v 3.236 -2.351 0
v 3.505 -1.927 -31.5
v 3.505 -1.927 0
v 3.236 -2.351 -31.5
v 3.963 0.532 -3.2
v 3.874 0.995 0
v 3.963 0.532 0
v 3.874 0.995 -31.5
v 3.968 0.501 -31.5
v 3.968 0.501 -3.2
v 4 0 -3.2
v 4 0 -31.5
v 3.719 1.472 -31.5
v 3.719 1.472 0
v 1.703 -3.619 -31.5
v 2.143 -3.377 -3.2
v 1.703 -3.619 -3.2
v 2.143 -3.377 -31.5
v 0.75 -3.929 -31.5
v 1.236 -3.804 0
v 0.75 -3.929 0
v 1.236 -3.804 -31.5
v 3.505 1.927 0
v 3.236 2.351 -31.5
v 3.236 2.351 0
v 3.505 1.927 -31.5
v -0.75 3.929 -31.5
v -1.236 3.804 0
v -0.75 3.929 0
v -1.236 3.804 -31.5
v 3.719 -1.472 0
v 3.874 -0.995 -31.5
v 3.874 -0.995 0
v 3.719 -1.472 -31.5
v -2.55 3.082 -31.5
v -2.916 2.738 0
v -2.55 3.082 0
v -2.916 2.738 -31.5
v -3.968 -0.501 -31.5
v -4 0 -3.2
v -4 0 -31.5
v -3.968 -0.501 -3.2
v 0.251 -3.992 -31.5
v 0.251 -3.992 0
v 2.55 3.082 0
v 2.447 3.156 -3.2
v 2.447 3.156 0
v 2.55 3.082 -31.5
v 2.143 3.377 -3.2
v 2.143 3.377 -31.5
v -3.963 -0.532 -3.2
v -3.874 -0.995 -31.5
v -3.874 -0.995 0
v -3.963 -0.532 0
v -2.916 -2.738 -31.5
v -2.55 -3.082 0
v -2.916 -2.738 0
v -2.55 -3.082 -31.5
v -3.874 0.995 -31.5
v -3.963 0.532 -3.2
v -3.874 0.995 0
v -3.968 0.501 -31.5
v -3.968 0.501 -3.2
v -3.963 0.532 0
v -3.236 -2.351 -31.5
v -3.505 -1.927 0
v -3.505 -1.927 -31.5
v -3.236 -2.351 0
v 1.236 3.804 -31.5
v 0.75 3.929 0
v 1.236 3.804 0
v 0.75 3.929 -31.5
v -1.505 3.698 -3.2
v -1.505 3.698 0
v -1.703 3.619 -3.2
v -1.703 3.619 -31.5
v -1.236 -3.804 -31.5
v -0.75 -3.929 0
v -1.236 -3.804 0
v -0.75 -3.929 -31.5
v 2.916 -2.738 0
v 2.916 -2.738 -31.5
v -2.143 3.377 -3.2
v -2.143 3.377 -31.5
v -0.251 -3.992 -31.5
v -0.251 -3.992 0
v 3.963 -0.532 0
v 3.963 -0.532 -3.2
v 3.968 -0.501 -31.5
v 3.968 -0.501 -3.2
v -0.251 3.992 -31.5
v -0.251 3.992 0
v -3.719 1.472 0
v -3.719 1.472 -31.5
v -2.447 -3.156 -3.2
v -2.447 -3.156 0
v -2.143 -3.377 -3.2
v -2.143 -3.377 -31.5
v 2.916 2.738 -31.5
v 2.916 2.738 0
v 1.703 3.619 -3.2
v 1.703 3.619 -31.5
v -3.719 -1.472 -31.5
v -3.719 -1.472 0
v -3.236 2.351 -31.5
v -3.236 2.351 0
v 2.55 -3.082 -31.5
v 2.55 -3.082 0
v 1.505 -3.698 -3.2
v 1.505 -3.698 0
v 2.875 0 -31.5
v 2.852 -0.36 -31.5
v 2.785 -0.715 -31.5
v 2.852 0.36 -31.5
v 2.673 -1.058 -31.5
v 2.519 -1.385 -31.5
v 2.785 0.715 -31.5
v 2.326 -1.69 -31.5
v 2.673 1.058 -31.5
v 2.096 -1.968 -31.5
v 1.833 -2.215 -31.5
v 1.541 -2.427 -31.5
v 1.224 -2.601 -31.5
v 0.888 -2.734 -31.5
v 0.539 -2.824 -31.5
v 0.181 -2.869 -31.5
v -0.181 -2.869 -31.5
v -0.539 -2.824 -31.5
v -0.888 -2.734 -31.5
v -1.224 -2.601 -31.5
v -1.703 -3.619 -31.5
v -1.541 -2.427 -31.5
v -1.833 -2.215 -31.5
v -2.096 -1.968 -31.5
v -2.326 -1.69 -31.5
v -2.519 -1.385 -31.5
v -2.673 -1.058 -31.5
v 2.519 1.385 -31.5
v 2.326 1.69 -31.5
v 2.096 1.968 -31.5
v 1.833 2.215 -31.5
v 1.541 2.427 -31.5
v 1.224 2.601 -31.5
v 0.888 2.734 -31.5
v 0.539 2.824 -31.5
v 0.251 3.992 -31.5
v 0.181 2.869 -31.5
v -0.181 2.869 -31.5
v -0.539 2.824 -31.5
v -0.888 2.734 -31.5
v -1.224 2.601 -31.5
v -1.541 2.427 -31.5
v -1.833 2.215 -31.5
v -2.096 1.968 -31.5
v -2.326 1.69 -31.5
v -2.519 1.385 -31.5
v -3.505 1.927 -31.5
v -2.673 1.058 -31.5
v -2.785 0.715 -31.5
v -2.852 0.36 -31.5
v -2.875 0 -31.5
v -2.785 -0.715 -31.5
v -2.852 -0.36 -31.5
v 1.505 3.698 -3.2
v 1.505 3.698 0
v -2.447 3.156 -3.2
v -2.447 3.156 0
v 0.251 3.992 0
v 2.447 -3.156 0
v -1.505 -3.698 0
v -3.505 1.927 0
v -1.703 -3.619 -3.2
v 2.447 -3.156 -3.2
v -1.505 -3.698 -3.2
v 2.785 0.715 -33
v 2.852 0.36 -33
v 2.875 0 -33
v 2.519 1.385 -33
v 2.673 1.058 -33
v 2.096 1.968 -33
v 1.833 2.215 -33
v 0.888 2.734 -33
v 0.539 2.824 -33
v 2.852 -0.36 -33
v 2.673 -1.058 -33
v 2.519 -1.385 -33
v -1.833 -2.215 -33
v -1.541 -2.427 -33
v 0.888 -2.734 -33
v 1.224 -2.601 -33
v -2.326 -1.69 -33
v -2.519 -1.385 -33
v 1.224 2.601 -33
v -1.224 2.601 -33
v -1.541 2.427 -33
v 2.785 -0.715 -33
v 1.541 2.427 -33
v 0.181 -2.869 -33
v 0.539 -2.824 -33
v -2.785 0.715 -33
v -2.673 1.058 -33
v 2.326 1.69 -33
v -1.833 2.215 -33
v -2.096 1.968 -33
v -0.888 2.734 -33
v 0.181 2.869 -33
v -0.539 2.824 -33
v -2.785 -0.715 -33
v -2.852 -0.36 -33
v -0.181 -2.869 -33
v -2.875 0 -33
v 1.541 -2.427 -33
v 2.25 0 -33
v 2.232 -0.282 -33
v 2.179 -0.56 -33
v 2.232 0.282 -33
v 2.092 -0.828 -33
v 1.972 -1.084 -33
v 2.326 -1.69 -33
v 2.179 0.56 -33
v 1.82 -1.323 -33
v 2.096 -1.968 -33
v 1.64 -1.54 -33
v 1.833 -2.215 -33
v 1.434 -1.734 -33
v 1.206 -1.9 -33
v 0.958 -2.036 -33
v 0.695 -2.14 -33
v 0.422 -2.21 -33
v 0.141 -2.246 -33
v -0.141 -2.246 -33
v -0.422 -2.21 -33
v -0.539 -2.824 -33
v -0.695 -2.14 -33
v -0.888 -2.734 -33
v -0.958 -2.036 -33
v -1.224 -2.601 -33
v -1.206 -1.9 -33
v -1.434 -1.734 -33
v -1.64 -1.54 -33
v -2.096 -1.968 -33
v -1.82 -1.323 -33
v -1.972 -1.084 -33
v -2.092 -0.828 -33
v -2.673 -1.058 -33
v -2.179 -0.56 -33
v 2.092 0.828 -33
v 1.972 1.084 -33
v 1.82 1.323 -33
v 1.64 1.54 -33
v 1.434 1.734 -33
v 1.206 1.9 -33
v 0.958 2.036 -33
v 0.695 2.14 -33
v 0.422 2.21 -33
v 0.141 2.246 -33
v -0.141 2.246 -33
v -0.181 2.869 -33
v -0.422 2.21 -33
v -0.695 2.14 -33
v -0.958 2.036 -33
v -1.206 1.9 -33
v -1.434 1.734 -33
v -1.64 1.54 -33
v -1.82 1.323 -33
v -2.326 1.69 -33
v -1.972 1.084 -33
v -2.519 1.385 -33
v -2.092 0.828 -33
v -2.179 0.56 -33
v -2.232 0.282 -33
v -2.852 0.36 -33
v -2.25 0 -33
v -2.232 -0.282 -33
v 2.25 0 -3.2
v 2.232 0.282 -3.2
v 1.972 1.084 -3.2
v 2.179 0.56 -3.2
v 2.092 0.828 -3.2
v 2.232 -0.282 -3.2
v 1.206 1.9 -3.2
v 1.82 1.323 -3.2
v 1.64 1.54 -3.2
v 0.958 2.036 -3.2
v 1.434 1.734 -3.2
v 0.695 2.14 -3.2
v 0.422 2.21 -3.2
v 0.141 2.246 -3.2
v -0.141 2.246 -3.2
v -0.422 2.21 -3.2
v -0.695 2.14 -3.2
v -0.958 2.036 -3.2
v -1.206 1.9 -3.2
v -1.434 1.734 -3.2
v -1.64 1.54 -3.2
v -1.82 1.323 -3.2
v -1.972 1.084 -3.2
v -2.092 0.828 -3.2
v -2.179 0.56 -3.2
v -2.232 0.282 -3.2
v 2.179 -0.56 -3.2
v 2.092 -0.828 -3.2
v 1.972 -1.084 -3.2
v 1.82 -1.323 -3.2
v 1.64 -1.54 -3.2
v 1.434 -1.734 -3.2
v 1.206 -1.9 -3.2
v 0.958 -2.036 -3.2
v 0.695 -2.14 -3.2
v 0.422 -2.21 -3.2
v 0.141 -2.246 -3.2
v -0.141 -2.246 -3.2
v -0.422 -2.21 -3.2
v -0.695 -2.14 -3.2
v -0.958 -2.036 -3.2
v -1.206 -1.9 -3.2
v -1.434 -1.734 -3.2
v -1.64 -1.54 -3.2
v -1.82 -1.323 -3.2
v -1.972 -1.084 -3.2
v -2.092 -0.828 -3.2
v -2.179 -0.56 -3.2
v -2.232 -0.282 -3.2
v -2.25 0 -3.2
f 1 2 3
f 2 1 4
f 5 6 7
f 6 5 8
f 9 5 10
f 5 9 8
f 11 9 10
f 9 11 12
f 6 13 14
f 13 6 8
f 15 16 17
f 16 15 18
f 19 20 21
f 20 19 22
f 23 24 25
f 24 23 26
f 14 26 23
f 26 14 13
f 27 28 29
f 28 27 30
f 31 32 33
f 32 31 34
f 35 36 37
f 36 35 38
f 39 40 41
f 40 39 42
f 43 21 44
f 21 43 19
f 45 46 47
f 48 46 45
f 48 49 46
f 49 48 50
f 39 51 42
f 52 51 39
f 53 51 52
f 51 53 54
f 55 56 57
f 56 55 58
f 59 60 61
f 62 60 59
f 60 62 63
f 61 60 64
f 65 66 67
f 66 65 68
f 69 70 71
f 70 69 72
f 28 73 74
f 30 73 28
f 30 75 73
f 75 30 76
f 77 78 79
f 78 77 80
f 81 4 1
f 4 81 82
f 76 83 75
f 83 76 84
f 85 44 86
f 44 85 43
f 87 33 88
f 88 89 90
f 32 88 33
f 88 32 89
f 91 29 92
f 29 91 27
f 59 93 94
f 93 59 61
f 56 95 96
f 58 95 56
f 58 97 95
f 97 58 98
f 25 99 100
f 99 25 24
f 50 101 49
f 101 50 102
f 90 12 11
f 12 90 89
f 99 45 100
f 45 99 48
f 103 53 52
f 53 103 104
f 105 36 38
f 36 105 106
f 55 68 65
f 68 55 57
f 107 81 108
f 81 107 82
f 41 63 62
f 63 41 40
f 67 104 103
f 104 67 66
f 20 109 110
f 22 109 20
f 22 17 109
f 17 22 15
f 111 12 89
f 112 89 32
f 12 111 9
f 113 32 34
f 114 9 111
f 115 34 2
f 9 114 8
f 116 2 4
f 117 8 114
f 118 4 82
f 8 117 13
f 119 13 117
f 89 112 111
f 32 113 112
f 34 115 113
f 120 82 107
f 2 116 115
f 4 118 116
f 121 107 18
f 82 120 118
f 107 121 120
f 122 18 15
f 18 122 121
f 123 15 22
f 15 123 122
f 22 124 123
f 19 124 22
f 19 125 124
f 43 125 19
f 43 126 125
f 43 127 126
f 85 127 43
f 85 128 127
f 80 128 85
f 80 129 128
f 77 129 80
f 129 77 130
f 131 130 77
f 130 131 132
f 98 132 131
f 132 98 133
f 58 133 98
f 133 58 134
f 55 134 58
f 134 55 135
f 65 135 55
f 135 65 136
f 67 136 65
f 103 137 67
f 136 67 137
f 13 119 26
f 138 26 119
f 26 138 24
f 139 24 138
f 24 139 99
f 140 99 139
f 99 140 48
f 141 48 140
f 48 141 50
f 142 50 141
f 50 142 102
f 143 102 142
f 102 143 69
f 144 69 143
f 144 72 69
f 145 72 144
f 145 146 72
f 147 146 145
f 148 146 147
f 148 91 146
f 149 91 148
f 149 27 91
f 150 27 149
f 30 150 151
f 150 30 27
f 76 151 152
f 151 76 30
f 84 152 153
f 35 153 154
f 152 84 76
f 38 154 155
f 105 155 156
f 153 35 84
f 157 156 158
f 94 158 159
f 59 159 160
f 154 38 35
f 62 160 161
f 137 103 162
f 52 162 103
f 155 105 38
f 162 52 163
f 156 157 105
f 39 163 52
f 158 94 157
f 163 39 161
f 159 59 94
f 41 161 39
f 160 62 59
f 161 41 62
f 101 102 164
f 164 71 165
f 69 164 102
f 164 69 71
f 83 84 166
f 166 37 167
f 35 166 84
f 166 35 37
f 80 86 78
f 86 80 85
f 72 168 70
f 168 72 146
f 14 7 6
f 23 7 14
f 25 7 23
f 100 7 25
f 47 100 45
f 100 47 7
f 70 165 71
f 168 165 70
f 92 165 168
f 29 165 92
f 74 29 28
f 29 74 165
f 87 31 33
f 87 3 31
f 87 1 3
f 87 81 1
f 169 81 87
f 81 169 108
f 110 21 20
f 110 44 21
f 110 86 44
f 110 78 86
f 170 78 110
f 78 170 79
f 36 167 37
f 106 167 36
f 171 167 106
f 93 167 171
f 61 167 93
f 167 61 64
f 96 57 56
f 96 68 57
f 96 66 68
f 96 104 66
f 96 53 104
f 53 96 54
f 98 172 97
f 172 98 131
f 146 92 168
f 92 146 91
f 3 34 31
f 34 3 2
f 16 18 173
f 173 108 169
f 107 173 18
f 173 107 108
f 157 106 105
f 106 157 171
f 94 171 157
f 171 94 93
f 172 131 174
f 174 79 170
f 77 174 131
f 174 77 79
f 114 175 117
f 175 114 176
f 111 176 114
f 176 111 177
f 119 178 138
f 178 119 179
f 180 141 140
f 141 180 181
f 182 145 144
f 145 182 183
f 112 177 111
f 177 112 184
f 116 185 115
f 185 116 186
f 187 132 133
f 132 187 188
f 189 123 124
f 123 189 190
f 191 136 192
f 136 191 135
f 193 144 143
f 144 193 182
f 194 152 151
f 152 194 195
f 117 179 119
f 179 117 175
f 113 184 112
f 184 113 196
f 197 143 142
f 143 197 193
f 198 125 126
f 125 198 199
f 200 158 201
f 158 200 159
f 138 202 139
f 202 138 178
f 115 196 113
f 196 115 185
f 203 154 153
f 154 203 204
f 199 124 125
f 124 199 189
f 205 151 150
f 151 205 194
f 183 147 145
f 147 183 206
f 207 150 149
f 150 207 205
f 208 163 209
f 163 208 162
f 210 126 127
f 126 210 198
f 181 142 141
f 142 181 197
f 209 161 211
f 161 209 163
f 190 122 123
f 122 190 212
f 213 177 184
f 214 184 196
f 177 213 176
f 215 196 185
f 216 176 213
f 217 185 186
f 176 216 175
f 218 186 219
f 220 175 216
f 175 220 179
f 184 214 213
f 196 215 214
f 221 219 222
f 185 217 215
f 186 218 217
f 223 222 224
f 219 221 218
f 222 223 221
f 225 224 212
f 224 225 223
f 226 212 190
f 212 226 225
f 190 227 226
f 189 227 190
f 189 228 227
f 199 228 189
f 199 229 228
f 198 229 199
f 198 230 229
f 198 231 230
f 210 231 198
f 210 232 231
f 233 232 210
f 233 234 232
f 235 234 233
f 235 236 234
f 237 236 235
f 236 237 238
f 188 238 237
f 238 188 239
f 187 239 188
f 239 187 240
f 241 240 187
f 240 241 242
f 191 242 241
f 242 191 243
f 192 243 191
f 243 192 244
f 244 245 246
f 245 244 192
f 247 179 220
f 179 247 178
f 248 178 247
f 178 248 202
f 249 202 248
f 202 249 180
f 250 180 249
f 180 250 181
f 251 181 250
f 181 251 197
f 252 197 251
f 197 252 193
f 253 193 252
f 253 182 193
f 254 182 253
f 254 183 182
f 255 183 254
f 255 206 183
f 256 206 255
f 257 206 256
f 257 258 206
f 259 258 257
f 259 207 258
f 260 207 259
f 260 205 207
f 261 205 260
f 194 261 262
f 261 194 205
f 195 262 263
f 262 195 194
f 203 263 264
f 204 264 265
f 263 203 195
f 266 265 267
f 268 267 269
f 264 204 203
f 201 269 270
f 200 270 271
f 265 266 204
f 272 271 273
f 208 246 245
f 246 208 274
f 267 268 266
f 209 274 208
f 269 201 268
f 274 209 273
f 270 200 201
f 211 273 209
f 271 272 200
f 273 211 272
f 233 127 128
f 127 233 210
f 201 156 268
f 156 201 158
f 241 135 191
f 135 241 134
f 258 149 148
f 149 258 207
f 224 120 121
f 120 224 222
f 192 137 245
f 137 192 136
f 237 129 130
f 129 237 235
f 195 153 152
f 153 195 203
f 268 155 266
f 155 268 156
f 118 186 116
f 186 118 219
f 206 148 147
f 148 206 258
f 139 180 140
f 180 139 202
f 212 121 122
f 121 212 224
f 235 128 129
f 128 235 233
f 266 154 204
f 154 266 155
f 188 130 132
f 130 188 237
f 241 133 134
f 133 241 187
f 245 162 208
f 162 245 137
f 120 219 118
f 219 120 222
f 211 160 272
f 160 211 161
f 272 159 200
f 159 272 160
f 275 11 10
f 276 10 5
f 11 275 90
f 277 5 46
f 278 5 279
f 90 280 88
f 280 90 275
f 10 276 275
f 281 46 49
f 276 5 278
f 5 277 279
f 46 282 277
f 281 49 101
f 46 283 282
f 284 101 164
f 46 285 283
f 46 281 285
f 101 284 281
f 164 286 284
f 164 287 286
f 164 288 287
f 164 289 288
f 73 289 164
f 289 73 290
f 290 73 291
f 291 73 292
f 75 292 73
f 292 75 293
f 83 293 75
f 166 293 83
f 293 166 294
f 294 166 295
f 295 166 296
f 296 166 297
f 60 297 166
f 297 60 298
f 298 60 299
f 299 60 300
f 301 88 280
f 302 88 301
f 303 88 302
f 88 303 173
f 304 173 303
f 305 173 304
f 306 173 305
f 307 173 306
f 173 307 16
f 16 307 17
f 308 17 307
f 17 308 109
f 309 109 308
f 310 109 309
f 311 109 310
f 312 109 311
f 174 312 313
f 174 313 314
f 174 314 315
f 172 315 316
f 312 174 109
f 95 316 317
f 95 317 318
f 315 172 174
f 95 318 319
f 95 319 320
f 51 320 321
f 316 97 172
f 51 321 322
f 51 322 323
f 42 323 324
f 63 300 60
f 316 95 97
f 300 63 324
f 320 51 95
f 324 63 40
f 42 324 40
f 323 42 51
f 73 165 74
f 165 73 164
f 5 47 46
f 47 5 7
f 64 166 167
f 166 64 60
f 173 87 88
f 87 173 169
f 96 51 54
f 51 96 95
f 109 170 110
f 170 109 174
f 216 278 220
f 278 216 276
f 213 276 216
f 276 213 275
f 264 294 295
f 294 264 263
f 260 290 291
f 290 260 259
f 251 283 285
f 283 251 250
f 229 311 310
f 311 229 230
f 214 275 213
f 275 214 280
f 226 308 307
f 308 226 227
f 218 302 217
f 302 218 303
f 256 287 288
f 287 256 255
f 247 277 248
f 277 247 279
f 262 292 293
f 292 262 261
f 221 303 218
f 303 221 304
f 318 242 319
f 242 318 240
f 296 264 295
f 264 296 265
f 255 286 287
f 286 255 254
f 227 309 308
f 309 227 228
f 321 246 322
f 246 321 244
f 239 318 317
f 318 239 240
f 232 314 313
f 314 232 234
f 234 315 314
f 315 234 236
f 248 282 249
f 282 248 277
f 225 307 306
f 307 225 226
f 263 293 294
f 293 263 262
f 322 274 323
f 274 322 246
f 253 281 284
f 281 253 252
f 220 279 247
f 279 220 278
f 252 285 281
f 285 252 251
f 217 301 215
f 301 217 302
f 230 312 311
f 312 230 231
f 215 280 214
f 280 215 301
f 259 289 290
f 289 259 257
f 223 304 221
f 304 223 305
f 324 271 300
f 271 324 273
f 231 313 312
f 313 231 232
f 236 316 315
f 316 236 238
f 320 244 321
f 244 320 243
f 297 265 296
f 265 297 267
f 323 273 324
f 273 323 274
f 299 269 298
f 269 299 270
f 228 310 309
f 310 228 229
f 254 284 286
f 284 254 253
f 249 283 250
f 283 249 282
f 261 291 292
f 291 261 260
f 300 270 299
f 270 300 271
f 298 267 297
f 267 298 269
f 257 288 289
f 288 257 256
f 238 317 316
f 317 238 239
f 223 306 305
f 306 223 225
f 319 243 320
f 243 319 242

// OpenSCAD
$fn = 50;

difference() {
	union() {
		translate(v = [0, 0, -31.5]) {
			cylinder(h = 31.5, r = 4.0);
		}
		#translate(v = [0, 0, -33.0]) {
			cylinder(h = 33, r = 2.875);
		}
	}
	union() {
		translate(v = [0, 0, 0]) {
			rotate(a = [0, 0, 0]) {
				difference() {
					union() {
						translate(v = [0, 0, -3.2]) {
							linear_extrude(height = 3.2) {
								polygon(points = [[4.2698, 0.0], [2.1349000000000005, 3.697755269078796], [-2.134899999999999, 3.6977552690787965], [-4.2698, 5.228996902999369e-16], [-2.134900000000002, -3.6977552690787956], [2.1348999999999974, -3.697755269078798]]);
							}
						}
					}
					union();
				}
			}
		}
		#translate(v = [0, 0, -100.0]) {
			cylinder(h = 200, r = 2.25);
		}
	}
}
